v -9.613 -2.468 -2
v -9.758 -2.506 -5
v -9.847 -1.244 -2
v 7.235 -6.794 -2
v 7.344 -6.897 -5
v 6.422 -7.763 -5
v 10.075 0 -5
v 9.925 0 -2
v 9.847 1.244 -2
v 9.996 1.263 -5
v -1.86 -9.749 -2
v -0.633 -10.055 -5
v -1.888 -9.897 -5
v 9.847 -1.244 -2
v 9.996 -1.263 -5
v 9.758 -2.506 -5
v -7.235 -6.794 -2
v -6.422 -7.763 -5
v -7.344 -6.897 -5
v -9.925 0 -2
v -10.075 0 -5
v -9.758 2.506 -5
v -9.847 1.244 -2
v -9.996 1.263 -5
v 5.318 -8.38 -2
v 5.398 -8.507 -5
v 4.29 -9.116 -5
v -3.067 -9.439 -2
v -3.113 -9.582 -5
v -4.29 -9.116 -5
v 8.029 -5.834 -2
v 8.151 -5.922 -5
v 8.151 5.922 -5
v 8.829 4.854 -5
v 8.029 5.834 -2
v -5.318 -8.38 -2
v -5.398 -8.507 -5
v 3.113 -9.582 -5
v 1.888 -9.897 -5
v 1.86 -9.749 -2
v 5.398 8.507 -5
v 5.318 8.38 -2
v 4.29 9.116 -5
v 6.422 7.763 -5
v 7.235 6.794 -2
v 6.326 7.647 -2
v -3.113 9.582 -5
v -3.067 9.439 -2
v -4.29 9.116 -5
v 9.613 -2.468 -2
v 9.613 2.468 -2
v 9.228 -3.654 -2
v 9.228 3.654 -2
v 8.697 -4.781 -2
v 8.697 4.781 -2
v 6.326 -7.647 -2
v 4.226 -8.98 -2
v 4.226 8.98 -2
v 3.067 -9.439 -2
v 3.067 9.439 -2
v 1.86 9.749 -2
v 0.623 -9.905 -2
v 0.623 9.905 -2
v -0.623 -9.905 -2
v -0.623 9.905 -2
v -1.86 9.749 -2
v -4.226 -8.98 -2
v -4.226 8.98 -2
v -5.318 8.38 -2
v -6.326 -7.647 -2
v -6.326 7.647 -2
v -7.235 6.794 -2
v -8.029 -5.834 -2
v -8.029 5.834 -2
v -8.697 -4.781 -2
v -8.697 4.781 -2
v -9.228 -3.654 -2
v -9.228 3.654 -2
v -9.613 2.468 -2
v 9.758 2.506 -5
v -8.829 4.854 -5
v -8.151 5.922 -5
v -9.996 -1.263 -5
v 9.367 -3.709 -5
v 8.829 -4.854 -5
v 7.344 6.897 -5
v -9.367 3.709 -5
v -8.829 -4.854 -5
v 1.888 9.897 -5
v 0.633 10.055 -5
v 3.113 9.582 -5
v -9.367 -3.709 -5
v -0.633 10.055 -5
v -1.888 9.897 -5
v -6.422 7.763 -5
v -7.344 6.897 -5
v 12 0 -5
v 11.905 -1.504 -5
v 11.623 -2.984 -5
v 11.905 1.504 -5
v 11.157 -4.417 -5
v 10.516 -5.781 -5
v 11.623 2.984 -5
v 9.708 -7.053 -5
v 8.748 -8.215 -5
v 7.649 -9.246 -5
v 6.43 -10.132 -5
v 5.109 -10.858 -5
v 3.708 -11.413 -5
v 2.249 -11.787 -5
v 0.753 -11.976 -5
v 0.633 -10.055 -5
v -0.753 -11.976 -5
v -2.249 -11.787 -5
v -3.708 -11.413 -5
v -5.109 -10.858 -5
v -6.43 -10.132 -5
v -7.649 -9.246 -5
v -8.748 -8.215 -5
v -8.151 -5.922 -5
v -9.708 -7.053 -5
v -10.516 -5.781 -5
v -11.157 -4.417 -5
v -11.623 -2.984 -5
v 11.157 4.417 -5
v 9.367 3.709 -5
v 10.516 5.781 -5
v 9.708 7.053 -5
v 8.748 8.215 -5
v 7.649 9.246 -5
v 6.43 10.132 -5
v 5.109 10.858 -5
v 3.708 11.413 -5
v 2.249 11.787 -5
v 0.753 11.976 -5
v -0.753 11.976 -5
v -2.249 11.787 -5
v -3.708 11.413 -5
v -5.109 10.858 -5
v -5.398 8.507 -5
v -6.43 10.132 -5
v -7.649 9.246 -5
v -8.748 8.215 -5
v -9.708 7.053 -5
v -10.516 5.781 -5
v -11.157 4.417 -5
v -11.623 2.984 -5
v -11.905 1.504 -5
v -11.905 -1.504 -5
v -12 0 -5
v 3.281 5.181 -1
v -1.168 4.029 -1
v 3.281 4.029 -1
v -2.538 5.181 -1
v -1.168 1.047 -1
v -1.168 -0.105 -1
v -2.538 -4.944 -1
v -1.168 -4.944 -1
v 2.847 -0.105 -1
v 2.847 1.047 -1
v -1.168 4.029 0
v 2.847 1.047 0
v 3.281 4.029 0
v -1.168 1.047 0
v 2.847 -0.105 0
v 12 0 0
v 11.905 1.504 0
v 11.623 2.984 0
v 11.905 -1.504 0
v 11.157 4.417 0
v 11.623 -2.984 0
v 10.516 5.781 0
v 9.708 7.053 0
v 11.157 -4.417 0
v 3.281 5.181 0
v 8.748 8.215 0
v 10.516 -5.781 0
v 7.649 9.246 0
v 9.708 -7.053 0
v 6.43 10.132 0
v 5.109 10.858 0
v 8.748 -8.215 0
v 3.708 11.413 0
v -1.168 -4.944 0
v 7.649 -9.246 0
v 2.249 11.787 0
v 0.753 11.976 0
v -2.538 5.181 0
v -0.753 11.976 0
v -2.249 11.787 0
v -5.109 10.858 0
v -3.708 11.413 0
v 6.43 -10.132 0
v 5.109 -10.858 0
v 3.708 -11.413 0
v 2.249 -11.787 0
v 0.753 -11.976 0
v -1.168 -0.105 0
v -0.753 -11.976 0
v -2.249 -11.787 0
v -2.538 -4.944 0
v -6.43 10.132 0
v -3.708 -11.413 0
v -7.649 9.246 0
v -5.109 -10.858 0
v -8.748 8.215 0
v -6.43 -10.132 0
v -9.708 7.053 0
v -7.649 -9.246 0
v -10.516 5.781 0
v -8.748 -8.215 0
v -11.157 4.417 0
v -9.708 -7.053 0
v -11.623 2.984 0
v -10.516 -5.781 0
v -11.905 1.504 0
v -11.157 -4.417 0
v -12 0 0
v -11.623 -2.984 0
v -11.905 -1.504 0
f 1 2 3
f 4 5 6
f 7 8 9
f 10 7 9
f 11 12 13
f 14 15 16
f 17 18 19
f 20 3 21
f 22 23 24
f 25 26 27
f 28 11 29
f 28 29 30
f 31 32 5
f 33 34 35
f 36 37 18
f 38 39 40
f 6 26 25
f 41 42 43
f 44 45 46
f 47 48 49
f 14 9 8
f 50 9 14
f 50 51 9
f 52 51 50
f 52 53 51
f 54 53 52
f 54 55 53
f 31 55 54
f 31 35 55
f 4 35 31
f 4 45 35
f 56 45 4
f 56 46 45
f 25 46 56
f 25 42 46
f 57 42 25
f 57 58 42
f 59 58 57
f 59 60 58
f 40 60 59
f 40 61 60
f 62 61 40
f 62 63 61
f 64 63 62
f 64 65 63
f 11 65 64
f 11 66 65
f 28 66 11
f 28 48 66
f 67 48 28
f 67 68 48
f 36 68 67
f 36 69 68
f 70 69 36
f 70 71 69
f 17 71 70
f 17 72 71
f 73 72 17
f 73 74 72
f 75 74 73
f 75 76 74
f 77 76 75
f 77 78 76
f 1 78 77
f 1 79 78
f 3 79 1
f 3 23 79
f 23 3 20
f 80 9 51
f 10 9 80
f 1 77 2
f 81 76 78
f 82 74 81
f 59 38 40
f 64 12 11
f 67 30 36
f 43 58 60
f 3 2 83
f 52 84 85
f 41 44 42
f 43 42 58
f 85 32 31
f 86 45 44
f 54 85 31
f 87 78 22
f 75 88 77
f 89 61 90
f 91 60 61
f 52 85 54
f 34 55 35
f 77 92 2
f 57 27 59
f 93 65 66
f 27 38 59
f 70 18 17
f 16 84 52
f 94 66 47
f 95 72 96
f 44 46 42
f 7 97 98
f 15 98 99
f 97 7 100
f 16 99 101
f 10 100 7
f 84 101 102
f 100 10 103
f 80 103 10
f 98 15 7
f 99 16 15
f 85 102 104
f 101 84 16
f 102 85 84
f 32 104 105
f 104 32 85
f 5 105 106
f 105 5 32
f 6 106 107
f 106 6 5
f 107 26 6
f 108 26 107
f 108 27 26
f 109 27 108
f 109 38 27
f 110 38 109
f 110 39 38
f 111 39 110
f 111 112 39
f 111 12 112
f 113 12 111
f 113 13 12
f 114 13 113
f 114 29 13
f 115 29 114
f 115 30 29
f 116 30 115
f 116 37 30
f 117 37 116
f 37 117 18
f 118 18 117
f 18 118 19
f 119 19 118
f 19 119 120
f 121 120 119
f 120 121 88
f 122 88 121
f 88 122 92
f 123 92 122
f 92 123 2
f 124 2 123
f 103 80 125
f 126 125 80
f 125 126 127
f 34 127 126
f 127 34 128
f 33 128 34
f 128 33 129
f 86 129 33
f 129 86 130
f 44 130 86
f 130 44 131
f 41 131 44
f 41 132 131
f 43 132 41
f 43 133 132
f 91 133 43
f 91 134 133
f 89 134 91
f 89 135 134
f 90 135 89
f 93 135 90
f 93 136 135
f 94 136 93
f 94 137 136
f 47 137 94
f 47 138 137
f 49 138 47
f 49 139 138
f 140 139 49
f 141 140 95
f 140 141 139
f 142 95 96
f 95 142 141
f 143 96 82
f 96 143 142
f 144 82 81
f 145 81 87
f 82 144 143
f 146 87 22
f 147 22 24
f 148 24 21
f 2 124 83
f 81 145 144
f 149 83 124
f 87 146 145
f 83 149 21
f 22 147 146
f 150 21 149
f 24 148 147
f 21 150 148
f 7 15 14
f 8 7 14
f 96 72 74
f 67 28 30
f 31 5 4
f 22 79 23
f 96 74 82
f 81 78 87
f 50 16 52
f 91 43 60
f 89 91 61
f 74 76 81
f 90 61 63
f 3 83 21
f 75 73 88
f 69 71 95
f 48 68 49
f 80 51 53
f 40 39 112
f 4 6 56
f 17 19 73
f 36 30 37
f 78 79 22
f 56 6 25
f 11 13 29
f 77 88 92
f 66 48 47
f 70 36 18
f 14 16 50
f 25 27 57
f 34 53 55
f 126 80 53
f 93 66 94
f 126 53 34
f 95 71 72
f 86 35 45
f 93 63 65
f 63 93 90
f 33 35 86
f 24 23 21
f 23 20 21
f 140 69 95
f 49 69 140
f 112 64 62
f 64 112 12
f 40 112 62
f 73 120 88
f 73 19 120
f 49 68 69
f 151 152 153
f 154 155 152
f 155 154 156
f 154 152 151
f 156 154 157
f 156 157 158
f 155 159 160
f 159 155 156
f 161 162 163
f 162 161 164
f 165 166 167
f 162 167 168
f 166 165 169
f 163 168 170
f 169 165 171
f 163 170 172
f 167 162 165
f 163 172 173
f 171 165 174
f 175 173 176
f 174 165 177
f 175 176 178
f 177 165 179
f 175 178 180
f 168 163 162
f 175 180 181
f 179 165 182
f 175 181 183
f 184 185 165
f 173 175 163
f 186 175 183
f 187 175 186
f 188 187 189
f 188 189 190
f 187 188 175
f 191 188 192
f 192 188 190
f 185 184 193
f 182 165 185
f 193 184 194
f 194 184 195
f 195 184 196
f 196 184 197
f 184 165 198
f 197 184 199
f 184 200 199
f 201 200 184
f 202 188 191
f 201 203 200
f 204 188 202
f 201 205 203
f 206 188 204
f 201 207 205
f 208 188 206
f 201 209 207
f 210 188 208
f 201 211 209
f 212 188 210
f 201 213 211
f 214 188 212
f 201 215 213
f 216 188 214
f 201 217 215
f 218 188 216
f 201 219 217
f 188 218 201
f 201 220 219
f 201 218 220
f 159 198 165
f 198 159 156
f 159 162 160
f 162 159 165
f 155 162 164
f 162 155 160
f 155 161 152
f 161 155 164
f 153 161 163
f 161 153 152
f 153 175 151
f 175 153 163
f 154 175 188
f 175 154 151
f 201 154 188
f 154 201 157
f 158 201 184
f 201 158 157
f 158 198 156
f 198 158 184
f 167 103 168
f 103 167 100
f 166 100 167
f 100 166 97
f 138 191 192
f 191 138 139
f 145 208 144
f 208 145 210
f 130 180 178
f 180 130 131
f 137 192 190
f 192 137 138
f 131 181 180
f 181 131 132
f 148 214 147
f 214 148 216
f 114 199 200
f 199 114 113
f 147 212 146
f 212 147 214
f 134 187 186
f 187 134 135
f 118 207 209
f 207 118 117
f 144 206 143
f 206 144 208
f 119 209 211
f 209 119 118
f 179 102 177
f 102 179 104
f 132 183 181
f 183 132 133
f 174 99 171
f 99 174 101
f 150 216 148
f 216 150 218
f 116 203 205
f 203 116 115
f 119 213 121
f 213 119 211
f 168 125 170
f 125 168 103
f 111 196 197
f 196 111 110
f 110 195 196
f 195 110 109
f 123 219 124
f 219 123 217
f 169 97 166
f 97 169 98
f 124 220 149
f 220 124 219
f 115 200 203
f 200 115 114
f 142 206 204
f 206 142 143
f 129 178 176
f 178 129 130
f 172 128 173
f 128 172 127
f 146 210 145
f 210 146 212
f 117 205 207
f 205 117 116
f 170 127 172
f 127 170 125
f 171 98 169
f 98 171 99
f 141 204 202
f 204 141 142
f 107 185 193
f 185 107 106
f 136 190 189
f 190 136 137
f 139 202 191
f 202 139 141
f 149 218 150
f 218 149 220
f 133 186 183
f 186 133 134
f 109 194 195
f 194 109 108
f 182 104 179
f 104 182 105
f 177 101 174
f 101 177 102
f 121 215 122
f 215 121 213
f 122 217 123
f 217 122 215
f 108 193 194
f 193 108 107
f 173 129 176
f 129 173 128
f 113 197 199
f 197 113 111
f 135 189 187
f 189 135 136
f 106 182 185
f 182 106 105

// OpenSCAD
$fn = 50;

difference() {
	union() {
		translate(v = [0, 0, -5.0]) {
			cylinder(h = 5, r = 12.0);
		}
	}
	union() {
		#translate(v = [0, 0, -5.0]) {
			cylinder(h = 3, r1 = 10.075, r2 = 9.925);
		}
		translate(v = [0, 0, -1]) {
			linear_extrude(height = 1) {
				text(font = "Impact", halign = "center", size = 10, text = "F", valign = "center");
			}
		}
	}
}
